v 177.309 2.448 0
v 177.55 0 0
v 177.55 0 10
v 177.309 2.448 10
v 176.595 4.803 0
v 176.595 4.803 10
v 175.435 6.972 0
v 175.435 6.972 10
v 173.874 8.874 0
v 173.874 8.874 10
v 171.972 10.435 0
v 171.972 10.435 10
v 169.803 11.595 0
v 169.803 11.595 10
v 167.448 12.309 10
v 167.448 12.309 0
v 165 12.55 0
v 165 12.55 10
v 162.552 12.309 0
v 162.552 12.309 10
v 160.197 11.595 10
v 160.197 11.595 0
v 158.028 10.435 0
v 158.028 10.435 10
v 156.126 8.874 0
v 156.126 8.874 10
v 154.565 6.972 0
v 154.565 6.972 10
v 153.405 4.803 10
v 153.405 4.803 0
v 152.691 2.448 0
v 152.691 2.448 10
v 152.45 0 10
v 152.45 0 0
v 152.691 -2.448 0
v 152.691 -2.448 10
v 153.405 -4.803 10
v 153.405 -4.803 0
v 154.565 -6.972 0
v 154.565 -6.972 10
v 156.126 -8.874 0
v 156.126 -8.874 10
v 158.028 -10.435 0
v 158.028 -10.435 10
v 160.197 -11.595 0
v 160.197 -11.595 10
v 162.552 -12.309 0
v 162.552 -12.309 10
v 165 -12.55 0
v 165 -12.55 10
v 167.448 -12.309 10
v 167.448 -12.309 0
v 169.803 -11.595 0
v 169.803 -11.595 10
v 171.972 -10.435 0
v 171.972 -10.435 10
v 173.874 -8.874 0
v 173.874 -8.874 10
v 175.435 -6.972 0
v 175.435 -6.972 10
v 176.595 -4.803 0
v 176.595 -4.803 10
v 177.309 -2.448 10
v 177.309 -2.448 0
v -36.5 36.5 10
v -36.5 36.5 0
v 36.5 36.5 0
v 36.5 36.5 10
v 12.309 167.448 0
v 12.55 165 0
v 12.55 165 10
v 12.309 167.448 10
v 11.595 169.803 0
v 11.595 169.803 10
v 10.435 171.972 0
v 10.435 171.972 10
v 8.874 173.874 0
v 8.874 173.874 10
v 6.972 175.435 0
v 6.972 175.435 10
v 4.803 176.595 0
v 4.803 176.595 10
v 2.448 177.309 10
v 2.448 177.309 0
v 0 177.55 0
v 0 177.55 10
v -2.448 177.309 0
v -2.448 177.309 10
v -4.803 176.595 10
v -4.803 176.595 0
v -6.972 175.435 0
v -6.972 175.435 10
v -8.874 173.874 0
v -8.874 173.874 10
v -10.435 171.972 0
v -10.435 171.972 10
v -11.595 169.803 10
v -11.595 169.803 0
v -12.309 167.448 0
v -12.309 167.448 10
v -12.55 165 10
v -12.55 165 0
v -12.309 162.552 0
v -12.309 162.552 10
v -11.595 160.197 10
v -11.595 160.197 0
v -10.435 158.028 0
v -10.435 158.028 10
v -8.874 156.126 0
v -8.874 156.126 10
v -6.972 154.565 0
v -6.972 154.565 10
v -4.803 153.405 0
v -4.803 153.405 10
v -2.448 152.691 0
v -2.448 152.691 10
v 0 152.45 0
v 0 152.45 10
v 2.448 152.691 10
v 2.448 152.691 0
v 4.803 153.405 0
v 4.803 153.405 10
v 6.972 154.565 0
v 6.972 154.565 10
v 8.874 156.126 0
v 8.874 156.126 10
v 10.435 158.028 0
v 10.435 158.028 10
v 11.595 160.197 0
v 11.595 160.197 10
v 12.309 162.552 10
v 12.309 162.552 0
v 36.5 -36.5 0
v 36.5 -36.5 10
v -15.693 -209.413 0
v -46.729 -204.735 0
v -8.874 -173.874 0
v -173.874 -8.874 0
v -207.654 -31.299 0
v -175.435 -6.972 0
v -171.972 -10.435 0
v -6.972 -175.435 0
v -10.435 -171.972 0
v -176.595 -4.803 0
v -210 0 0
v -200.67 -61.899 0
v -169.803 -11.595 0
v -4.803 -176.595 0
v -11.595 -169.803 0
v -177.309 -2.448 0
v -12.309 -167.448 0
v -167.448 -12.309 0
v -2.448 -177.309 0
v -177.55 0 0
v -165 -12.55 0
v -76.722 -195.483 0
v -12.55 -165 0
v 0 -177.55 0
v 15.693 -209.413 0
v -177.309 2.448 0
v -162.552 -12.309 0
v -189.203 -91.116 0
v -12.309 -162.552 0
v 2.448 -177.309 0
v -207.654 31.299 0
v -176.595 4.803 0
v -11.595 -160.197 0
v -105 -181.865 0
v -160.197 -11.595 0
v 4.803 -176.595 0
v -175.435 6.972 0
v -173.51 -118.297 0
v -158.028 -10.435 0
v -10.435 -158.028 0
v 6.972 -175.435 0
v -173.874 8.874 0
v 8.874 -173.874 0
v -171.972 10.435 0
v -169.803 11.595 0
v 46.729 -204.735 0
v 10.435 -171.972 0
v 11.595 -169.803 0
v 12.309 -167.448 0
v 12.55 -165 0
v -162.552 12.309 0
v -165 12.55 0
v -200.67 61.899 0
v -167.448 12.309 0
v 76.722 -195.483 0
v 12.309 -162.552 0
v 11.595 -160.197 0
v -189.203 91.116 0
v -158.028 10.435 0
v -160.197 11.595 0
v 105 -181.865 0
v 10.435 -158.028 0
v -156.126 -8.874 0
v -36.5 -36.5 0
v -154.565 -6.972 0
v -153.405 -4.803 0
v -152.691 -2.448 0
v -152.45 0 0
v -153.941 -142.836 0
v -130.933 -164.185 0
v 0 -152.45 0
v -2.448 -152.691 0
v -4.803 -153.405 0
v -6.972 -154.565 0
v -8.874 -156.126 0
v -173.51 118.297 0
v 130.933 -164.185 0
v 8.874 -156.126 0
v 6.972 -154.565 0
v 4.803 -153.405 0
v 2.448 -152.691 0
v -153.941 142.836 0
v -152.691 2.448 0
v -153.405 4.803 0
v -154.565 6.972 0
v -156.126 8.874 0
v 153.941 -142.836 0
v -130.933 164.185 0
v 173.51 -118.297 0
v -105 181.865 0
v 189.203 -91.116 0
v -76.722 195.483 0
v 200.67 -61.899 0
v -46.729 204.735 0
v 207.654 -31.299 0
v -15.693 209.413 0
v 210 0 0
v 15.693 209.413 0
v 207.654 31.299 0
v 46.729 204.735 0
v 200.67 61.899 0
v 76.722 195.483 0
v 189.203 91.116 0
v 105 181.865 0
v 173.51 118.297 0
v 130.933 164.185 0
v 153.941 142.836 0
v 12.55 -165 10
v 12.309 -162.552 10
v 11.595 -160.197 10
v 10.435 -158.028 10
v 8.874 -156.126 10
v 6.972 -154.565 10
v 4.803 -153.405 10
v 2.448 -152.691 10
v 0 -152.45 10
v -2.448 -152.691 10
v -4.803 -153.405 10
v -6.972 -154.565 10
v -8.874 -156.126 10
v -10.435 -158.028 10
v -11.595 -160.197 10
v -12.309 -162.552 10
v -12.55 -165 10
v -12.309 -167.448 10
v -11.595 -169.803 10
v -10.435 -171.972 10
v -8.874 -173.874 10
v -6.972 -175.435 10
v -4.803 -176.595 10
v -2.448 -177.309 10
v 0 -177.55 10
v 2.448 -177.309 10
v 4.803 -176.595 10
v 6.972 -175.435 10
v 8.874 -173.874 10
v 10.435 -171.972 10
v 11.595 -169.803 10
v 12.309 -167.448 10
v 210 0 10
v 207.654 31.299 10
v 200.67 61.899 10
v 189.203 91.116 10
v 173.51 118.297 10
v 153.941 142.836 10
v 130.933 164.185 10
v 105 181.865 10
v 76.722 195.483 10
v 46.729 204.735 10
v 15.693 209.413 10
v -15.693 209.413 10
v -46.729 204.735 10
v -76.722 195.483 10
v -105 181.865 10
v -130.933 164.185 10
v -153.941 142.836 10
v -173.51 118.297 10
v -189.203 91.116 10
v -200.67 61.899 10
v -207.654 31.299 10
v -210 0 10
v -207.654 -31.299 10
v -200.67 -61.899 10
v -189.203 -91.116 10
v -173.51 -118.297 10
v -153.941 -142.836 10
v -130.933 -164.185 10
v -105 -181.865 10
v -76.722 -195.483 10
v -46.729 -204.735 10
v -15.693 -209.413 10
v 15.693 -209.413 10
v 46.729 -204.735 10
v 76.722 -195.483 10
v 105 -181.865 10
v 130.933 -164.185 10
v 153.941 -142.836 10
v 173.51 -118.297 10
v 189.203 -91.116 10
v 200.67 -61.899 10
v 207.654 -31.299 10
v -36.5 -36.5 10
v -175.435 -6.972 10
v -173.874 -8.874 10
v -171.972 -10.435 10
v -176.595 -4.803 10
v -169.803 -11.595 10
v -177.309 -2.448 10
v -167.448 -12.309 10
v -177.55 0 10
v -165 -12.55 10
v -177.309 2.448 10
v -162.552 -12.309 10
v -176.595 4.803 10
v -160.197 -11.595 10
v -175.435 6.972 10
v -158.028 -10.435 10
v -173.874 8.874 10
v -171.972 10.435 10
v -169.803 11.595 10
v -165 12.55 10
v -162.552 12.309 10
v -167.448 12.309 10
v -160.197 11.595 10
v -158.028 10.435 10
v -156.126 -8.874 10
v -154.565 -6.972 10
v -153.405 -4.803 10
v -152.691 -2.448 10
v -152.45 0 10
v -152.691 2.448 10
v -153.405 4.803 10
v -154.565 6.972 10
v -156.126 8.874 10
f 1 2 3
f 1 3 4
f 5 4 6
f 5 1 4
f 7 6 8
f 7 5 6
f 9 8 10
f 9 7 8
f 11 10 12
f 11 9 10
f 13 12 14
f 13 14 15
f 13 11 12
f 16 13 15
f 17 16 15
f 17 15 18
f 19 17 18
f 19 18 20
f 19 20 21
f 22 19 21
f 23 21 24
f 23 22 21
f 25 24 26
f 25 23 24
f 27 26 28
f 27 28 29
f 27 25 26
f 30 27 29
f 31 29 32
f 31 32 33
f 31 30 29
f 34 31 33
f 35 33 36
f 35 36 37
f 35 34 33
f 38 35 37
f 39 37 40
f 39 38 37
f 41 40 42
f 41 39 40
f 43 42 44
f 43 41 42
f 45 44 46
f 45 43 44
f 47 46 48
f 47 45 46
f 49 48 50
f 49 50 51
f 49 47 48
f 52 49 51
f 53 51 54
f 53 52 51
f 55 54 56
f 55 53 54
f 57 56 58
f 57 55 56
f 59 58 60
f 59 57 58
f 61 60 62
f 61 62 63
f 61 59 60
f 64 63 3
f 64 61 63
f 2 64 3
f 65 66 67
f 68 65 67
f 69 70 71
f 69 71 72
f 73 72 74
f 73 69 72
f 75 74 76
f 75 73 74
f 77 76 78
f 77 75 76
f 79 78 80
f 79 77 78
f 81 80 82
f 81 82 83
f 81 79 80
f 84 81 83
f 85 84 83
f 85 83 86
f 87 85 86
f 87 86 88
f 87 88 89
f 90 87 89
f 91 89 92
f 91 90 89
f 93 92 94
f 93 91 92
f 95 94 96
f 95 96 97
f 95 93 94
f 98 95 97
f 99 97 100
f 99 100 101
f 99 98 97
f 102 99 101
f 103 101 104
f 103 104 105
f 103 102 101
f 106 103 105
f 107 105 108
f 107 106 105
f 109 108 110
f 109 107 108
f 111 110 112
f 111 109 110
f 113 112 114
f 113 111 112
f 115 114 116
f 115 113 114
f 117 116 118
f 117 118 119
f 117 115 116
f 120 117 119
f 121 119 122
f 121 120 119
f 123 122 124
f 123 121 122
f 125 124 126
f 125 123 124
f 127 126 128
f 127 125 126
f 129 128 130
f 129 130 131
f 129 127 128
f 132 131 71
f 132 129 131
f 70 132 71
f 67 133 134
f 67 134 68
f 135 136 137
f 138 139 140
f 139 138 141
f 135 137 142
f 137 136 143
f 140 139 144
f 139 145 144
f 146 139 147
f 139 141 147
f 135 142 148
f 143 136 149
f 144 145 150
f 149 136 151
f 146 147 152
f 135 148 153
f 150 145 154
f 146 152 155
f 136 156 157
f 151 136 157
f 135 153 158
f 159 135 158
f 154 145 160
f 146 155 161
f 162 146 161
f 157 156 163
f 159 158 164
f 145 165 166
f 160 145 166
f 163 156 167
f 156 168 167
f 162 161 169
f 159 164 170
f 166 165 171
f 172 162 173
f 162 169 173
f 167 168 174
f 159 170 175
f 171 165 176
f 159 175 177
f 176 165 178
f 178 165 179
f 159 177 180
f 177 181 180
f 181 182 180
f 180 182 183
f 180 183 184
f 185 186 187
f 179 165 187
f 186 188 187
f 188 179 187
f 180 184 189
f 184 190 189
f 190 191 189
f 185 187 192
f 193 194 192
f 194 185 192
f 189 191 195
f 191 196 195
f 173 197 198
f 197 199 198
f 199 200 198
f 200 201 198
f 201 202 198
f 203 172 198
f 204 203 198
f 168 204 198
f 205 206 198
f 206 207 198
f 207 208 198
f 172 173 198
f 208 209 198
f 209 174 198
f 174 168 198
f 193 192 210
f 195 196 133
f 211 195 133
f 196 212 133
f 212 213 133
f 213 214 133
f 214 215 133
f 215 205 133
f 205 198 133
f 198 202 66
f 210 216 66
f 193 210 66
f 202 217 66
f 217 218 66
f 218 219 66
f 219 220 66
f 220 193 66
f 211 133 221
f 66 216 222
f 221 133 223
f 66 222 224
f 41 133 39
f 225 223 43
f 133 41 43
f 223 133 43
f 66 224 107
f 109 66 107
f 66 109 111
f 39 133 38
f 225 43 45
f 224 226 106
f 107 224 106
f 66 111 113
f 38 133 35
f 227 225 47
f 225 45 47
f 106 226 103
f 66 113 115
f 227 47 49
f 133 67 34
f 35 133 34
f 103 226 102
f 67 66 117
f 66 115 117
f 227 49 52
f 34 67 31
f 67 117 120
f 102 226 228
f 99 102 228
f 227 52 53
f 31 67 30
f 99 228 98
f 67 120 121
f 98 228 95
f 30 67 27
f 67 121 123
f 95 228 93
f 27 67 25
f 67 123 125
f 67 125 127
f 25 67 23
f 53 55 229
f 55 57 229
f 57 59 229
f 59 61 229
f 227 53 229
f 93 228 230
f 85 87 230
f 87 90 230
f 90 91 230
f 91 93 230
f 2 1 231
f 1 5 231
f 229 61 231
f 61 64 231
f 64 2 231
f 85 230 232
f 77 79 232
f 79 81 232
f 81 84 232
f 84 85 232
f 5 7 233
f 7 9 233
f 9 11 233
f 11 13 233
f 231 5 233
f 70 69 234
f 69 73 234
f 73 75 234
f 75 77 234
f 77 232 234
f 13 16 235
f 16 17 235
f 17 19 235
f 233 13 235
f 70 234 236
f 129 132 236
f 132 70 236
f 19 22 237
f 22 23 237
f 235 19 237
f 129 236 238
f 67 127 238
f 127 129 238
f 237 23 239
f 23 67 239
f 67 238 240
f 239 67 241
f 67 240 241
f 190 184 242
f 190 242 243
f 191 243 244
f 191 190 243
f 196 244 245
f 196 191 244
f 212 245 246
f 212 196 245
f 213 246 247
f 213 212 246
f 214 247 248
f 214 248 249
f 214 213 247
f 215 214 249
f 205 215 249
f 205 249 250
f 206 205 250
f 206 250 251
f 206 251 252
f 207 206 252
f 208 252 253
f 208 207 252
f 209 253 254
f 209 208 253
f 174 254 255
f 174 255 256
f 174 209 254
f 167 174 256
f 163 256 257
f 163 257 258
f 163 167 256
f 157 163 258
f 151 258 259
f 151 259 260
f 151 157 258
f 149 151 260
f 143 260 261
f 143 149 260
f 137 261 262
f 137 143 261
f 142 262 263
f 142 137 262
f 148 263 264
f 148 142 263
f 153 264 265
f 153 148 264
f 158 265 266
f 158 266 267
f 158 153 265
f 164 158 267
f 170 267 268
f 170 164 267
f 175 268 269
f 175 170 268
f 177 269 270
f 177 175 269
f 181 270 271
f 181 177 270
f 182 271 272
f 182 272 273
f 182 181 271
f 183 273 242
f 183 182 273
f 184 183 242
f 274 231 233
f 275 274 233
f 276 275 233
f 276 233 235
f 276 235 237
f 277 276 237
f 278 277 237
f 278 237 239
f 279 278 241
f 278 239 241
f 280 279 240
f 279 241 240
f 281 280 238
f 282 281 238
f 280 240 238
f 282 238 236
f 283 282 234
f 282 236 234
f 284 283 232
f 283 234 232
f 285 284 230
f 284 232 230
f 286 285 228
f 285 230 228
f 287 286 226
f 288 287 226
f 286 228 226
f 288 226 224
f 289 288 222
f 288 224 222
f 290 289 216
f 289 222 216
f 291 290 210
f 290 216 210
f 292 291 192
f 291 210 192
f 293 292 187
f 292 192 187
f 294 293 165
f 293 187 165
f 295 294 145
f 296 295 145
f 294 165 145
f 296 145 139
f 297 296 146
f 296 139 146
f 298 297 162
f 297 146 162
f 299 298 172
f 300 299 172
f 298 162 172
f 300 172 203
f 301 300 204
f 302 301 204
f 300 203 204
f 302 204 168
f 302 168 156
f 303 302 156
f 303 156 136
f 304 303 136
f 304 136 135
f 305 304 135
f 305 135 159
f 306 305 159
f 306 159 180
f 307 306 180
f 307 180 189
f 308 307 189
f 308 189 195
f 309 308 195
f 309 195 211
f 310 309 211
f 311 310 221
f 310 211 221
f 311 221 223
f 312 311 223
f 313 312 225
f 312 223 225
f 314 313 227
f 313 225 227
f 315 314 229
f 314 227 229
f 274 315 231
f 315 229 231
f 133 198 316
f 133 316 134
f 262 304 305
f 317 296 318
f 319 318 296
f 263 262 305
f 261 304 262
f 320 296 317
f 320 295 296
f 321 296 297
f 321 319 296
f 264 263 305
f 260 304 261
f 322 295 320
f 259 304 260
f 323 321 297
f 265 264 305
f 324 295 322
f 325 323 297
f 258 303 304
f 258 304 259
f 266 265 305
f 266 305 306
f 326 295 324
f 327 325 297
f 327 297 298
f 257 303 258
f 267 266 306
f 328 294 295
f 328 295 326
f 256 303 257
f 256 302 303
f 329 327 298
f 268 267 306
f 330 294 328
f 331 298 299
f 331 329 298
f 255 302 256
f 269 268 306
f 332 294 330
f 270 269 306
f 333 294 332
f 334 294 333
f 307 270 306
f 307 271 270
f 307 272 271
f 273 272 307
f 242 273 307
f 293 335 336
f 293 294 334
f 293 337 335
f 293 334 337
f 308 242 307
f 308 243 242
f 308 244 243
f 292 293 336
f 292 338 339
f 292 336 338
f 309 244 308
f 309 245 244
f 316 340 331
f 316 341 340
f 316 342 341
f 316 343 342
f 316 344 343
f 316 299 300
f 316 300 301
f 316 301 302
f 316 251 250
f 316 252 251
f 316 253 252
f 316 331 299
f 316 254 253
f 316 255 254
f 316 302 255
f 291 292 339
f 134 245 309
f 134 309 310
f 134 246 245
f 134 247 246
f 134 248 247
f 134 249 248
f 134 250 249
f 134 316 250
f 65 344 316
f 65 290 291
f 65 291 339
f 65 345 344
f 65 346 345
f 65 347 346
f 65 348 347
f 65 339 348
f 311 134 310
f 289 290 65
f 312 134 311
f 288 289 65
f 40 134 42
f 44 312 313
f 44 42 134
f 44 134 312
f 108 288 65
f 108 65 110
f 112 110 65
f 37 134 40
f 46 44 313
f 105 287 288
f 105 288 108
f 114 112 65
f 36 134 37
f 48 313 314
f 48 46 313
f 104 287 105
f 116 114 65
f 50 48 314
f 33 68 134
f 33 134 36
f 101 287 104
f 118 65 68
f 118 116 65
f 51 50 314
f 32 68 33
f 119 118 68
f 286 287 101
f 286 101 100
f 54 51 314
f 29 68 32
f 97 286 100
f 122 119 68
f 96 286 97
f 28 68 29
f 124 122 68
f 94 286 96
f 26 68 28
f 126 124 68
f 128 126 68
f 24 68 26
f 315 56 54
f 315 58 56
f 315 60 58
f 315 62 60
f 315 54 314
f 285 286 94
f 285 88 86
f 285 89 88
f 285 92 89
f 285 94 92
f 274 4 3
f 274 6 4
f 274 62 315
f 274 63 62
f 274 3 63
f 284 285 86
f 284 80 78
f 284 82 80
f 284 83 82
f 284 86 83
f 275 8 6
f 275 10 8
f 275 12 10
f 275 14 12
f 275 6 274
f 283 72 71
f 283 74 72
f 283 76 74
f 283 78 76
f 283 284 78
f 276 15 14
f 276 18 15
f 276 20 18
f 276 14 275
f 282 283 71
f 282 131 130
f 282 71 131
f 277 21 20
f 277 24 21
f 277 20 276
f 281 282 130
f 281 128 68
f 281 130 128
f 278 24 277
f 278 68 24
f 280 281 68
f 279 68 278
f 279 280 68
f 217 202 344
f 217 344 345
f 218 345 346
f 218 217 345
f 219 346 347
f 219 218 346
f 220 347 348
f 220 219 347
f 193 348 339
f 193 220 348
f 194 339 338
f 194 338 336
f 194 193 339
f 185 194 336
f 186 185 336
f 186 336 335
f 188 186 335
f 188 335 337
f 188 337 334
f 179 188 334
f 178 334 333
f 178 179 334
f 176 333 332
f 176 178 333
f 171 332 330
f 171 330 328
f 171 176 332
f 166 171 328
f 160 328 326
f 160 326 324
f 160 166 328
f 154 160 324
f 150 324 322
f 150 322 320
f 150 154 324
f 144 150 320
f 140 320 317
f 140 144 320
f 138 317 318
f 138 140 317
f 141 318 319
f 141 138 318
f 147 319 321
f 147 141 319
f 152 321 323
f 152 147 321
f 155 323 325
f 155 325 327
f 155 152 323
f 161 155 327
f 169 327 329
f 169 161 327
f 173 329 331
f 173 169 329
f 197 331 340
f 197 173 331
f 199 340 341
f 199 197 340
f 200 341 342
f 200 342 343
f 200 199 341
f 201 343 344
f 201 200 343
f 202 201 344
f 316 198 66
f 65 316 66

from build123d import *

# Parameters (mm, degrees)
IZIM1_R                     = 210
IZIM1_R_2                   = 12.55
IZIM1_W                     = 73
IZIM1_H                     = 73
Y_KSEKLIK_EKSTR_ZYON1_DEPTH = 10


with BuildPart() as part:
    # Çizim1 → Yükseklik-Ekstrüzyon1 (new body)
    with BuildSketch(Plane.XY):
        Circle(IZIM1_R)
        with Locations((0, 165)):
            Circle(IZIM1_R_2, mode=Mode.SUBTRACT)
        with Locations((165, 0)):
            Circle(IZIM1_R_2, mode=Mode.SUBTRACT)
        with Locations((0, -165)):
            Circle(IZIM1_R_2, mode=Mode.SUBTRACT)
        with Locations((-165, 0)):
            Circle(IZIM1_R_2, mode=Mode.SUBTRACT)
        Rectangle(IZIM1_W, IZIM1_H, mode=Mode.SUBTRACT)
    extrude(amount=Y_KSEKLIK_EKSTR_ZYON1_DEPTH)


solid = part.part
